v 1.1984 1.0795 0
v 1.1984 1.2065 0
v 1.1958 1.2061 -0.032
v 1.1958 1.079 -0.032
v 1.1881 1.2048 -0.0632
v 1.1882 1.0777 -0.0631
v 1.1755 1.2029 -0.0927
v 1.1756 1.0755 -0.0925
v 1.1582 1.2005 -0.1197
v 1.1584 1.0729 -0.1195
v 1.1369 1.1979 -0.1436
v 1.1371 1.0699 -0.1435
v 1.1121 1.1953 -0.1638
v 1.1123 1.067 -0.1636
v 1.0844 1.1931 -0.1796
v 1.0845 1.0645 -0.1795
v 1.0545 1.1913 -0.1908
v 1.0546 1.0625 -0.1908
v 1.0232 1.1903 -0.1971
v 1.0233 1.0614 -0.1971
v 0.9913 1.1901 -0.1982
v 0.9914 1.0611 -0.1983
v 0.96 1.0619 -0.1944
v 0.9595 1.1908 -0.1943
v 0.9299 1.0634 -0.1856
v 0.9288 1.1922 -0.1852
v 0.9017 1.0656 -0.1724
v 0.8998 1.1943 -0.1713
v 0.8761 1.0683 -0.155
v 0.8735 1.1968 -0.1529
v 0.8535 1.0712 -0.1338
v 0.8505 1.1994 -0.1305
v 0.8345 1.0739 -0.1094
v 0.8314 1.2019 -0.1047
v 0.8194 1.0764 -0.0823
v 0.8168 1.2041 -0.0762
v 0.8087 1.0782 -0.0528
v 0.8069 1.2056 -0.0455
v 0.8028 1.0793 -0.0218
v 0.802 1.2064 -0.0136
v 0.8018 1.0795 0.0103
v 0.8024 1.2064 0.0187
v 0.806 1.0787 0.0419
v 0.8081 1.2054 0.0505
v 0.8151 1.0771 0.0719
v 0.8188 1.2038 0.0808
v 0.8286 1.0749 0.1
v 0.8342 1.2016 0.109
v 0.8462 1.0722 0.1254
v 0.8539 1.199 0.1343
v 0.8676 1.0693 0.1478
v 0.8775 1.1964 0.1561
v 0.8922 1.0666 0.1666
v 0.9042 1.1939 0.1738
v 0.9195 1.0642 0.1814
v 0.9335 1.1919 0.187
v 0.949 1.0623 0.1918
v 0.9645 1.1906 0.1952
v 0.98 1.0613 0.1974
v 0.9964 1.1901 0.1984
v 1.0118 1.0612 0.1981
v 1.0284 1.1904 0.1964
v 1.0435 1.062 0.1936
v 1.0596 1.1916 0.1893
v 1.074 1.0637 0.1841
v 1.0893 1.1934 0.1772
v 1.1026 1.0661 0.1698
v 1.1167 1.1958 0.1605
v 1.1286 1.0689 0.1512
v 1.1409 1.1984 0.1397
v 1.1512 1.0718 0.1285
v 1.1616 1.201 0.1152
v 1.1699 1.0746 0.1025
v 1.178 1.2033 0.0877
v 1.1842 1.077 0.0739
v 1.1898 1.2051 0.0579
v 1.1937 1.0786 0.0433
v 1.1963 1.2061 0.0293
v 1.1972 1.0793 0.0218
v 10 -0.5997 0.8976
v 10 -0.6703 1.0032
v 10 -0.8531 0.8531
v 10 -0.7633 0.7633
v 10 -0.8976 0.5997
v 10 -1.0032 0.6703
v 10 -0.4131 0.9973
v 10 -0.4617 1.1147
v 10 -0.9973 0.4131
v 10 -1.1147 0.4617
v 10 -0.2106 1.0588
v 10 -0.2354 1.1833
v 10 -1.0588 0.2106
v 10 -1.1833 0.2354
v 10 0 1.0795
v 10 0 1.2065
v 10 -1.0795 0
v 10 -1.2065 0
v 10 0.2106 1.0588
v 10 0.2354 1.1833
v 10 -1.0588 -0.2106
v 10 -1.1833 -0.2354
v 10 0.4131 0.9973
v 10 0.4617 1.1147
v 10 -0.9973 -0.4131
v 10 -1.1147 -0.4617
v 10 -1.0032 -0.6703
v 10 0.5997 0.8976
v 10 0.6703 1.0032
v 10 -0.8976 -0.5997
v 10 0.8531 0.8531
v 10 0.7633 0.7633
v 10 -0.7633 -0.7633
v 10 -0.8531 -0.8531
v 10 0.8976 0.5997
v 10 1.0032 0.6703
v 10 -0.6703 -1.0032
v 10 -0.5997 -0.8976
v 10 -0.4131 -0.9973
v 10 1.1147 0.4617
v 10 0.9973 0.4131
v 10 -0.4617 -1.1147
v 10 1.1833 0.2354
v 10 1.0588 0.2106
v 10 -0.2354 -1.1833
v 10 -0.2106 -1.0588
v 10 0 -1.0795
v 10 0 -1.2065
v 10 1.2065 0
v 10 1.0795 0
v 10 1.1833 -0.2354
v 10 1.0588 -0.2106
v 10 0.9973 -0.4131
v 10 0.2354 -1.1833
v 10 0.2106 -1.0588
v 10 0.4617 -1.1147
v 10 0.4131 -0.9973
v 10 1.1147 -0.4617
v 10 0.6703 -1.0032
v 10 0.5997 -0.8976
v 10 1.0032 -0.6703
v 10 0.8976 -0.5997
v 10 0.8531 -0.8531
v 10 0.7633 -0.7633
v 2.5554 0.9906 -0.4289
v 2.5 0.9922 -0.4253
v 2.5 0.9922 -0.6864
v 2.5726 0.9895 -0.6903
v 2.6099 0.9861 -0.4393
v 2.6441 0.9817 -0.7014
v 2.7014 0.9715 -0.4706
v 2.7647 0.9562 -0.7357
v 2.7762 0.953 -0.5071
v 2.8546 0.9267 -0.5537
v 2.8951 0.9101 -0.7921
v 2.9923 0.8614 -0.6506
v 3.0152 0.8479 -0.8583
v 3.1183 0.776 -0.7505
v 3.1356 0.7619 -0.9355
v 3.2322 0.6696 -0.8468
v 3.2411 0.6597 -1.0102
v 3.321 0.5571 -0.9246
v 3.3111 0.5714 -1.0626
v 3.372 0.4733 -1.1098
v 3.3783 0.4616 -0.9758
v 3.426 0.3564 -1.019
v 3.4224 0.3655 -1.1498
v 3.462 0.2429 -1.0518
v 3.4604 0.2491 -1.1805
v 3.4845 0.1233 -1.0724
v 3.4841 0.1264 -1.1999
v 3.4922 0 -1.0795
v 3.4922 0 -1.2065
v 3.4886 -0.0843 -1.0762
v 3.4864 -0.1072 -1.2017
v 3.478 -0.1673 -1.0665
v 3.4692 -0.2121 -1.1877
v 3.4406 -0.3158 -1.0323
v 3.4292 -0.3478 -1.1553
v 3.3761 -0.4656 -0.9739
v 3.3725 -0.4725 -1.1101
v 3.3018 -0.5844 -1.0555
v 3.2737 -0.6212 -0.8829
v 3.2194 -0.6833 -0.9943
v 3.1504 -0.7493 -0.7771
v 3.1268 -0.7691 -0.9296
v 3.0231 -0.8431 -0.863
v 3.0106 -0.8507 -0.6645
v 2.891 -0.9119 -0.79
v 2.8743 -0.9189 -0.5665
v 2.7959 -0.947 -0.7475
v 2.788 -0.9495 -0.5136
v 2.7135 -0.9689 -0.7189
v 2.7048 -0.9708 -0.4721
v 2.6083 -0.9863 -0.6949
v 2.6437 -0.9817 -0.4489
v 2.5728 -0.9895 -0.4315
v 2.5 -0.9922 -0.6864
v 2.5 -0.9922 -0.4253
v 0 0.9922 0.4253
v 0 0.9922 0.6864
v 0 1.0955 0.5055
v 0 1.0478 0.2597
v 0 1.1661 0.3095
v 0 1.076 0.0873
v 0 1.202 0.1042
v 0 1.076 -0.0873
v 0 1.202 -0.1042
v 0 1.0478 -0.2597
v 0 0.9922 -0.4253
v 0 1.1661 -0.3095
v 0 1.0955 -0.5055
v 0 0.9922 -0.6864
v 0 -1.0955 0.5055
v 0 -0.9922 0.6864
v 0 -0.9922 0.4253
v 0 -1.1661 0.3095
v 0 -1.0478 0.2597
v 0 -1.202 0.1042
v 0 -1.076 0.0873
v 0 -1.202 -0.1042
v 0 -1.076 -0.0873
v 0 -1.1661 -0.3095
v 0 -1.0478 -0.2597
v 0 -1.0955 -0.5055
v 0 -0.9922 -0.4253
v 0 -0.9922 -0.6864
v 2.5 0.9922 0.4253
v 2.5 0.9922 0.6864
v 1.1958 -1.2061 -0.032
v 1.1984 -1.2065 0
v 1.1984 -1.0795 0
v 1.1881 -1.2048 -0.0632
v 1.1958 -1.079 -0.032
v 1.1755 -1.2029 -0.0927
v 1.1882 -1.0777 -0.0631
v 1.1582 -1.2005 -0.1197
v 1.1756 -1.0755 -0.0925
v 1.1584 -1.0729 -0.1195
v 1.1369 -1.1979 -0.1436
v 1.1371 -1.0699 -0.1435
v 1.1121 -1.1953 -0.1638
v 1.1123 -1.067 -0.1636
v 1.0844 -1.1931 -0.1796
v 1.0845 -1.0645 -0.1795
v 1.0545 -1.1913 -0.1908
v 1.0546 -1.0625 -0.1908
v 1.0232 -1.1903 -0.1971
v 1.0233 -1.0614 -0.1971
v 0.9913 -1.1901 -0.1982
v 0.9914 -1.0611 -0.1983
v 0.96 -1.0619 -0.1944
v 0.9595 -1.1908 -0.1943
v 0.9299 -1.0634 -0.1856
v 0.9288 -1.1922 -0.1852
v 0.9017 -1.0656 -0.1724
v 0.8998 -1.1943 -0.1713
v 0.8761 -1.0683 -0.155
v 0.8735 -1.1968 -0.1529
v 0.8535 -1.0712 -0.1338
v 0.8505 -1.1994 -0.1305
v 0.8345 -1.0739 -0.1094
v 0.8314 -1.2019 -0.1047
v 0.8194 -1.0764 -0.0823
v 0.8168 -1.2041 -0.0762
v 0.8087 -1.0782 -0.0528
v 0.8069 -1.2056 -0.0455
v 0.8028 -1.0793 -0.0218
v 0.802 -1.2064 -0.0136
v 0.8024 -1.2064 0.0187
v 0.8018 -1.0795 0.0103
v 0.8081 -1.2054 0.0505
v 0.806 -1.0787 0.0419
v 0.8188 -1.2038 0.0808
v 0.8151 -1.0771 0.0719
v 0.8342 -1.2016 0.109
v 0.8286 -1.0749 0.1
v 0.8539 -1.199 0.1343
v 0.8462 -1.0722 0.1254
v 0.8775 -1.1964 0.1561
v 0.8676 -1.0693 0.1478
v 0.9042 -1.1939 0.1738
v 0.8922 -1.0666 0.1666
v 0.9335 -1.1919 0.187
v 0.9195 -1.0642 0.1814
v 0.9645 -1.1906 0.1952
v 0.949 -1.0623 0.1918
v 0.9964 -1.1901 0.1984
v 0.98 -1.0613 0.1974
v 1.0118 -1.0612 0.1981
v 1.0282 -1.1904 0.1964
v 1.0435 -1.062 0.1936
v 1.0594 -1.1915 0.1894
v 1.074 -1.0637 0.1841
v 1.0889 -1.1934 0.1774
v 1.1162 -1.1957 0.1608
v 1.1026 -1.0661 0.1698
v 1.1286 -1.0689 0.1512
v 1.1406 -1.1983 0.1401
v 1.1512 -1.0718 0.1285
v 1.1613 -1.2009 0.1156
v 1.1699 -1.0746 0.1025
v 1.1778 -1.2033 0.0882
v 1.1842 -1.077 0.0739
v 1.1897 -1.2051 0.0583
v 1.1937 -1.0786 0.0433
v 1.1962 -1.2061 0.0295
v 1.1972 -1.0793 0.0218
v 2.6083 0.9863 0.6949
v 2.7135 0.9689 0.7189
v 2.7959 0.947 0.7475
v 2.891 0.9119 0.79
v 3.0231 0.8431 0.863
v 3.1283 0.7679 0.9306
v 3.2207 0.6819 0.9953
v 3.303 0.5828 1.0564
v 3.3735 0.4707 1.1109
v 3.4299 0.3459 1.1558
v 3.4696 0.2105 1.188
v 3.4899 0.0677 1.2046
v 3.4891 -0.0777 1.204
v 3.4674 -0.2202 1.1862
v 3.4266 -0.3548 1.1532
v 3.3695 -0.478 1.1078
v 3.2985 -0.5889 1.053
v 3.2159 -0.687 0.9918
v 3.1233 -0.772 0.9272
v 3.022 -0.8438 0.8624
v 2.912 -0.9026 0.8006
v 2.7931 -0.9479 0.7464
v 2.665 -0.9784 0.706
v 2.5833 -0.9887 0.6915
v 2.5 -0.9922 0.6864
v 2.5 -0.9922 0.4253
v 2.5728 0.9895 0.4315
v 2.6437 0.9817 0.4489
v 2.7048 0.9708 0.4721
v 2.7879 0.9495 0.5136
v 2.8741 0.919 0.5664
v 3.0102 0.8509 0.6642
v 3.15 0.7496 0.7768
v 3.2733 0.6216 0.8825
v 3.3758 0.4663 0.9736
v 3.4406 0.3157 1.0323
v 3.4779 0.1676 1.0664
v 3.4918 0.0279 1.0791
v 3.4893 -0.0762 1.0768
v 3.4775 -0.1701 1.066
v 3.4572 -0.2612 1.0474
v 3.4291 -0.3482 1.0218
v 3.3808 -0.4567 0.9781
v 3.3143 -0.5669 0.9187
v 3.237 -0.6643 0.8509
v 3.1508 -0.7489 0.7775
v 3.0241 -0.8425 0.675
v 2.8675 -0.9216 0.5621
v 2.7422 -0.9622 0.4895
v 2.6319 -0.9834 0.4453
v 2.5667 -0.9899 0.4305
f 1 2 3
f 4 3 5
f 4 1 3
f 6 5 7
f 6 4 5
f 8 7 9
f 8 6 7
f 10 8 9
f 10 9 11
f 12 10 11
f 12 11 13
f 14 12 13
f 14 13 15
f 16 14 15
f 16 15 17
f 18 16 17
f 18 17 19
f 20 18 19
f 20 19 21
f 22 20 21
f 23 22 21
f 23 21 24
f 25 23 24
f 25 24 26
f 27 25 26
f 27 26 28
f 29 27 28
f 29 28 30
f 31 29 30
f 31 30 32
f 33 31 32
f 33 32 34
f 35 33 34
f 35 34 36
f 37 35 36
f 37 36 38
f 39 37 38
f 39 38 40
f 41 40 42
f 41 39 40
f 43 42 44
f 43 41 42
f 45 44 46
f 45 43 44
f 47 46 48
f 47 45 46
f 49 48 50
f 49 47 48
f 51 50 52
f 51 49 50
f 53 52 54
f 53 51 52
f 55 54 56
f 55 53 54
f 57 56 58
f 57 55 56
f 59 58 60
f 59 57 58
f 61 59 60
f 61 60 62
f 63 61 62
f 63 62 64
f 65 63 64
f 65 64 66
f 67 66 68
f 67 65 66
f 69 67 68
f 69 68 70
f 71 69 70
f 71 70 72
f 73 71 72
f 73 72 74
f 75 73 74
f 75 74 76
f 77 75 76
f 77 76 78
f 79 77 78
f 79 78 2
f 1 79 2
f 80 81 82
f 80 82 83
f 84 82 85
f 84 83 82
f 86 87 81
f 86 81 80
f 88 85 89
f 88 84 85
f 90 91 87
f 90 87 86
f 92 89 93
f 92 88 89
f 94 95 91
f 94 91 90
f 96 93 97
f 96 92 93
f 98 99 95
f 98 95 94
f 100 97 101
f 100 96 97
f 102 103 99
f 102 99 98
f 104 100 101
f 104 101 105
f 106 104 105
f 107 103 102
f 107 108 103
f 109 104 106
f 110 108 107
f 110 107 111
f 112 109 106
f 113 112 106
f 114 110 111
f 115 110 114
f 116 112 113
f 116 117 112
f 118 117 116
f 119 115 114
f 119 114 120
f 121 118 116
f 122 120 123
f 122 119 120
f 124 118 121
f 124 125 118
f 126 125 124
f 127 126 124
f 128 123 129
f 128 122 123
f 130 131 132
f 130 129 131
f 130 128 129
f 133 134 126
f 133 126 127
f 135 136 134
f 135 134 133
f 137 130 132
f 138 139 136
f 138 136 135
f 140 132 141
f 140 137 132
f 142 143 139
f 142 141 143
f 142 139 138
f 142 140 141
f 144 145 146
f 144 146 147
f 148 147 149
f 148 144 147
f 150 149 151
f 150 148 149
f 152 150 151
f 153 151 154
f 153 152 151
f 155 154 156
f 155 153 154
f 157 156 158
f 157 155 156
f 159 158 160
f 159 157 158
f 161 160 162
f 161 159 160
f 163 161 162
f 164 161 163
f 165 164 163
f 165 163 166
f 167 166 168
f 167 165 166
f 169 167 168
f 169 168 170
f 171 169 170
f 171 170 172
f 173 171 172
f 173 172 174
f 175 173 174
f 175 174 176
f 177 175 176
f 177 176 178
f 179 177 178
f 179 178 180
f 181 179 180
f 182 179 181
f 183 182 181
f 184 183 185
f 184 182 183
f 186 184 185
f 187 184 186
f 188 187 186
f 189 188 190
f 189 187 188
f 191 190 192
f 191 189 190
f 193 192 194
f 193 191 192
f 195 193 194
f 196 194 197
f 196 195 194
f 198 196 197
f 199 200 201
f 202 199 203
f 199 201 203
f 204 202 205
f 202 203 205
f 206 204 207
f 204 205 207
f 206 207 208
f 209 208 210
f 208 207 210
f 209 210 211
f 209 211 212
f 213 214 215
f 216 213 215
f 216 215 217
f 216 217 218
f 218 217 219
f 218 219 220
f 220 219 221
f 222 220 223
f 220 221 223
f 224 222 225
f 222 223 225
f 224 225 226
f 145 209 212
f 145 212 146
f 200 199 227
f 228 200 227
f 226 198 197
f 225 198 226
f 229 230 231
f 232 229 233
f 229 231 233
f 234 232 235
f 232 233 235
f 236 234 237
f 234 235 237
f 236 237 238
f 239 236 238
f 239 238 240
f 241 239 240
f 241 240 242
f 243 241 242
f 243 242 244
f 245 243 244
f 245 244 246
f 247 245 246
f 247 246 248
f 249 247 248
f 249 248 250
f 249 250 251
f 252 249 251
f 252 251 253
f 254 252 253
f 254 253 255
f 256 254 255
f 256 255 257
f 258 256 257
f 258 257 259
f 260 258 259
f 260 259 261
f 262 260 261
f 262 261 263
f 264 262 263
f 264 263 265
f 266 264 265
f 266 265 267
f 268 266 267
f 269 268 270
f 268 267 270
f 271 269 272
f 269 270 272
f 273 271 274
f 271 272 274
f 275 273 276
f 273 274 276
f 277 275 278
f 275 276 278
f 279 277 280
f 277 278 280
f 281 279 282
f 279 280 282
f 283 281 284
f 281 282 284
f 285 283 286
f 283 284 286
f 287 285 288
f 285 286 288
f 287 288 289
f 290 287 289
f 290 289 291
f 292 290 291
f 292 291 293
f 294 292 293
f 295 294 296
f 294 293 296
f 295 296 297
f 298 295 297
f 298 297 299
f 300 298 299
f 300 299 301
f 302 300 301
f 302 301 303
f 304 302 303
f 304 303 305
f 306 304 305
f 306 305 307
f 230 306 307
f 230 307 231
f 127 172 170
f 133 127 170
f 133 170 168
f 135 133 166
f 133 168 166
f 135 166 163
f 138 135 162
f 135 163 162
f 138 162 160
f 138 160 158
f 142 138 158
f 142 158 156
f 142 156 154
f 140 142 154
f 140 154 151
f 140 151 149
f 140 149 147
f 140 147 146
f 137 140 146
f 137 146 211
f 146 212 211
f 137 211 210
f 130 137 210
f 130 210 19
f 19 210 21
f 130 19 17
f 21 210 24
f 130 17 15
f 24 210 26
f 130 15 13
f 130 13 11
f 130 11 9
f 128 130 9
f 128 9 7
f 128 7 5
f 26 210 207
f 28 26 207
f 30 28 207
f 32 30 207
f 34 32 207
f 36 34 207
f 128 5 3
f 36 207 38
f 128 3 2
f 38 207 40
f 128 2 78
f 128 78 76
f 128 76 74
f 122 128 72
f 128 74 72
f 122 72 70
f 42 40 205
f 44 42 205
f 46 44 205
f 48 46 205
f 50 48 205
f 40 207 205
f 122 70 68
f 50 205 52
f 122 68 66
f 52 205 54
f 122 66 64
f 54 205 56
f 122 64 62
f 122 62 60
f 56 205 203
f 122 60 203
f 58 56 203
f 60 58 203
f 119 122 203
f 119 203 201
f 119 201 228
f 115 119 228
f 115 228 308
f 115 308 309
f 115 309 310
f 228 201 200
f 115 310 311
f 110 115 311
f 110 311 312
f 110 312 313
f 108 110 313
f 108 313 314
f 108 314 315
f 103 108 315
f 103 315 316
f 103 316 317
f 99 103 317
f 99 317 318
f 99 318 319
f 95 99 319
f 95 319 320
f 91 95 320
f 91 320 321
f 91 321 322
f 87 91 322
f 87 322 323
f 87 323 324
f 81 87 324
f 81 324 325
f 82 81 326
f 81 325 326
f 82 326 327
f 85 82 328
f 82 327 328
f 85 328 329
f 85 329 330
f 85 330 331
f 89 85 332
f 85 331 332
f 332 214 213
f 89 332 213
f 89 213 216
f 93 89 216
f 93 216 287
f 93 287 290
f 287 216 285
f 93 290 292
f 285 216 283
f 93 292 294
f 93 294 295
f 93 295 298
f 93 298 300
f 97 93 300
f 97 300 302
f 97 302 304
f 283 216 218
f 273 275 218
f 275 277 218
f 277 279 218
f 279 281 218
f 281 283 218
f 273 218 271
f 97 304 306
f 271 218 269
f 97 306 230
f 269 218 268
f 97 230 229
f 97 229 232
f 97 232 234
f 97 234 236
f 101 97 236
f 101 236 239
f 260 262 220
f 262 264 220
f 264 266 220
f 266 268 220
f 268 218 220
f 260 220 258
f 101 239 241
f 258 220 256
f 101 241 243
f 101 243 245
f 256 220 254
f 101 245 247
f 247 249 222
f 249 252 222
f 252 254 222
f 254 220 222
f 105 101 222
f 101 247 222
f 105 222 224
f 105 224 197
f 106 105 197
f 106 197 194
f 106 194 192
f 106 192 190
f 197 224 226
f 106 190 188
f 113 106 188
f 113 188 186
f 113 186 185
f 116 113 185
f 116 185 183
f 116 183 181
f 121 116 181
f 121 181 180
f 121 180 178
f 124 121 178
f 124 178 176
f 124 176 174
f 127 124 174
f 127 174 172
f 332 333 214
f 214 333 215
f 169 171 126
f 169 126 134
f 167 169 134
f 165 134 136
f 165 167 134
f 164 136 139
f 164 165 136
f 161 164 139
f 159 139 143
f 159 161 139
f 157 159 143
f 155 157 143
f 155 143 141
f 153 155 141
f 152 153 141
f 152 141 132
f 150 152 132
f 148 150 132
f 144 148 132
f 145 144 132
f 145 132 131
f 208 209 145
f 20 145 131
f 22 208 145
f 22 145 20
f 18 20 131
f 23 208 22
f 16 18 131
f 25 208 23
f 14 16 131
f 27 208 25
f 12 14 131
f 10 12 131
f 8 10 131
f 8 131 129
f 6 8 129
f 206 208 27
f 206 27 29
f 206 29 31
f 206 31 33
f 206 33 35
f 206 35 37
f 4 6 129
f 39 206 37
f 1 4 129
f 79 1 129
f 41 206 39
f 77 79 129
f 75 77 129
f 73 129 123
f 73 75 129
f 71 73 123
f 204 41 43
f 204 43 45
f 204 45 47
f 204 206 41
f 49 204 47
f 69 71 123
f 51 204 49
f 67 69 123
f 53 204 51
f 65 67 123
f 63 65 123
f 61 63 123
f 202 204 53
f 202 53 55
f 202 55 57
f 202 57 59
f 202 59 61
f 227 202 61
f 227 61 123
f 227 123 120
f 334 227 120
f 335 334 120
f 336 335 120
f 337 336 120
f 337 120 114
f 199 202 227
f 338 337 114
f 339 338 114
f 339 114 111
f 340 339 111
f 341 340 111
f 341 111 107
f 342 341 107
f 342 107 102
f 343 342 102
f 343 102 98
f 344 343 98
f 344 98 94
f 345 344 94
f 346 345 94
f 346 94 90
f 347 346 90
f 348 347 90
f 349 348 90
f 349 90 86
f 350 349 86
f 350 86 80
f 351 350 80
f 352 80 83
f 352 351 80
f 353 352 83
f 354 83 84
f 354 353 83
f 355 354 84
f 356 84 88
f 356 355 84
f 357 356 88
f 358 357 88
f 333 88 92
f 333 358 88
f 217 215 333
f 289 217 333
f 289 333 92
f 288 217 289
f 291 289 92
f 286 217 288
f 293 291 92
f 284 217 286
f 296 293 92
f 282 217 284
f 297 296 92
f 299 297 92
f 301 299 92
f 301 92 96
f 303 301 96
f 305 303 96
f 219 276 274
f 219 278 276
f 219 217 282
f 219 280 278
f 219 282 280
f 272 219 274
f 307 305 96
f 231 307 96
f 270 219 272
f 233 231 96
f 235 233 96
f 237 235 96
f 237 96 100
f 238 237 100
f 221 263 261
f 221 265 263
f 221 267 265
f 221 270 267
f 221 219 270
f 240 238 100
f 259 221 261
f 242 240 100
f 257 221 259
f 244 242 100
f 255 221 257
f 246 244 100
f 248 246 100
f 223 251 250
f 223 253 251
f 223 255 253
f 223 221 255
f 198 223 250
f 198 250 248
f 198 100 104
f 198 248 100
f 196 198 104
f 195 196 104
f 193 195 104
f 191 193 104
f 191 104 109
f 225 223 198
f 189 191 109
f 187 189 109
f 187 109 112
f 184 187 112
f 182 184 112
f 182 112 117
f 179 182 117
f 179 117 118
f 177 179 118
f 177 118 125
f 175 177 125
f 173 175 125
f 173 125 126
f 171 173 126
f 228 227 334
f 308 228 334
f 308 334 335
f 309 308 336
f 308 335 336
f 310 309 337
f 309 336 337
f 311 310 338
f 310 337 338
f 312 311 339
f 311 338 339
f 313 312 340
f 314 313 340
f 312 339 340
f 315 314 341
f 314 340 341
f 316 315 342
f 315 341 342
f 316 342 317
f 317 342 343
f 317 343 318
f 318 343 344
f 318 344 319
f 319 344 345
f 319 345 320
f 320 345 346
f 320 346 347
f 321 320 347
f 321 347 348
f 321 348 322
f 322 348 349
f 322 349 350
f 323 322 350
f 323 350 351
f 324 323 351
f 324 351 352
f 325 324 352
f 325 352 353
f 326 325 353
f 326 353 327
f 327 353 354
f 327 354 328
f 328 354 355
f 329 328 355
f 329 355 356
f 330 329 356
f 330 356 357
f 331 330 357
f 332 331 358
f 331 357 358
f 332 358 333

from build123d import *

# Parameters (mm, degrees)
SKETCH1_R               = 1.2065
SKETCH1_R_2             = 1.0795
BOSS_EXTRUDE1_DEPTH     = 10
CUT_EXTRUDE1_DEPTH      = 10
CUT_EXTRUDE1_DEPTH_BACK = 1.5
SKETCH4_R               = 0.1984375
CUT_EXTRUDE2_DEPTH      = 5
CUT_EXTRUDE2_DEPTH_BACK = 5


with BuildPart() as part:
    # Sketch1 → Boss-Extrude1 (new body)
    with BuildSketch(Plane(origin=(0, 0, 0), x_dir=(0, 0, -1), z_dir=(1, 0, 0))):
        Circle(SKETCH1_R)
        Circle(SKETCH1_R_2, mode=Mode.SUBTRACT)
    extrude(amount=BOSS_EXTRUDE1_DEPTH)

    # Sketch2 → Cut-Extrude1 (cut, two sides)
    with BuildSketch(Plane.XY) as cut_extrude1_sk:
        with BuildLine():
            Line((2.5, -0.9921875), (0, -0.9921875))
            Line((0, -0.9921875), (0, 0.9921875))
            Line((0, 0.9921875), (2.5, 0.9921875))
            ThreePointArc((2.5, 0.9921875), (3.4921875, 0), (2.5, -0.9921875))
        make_face()
    extrude(amount=CUT_EXTRUDE1_DEPTH, mode=Mode.SUBTRACT)
    extrude(cut_extrude1_sk.sketch, amount=-CUT_EXTRUDE1_DEPTH_BACK, mode=Mode.SUBTRACT)

    # Sketch4 → Cut-Extrude2 (cut, two sides)
    with BuildSketch(Plane(origin=(0, 0, 0), x_dir=(1, 0, 0), z_dir=(0, 1, 0))) as cut_extrude2_sk:
        with Locations((1, 0)):
            Circle(SKETCH4_R)
    extrude(amount=CUT_EXTRUDE2_DEPTH, mode=Mode.SUBTRACT)
    extrude(cut_extrude2_sk.sketch, amount=-CUT_EXTRUDE2_DEPTH_BACK, mode=Mode.SUBTRACT)


solid = part.part
